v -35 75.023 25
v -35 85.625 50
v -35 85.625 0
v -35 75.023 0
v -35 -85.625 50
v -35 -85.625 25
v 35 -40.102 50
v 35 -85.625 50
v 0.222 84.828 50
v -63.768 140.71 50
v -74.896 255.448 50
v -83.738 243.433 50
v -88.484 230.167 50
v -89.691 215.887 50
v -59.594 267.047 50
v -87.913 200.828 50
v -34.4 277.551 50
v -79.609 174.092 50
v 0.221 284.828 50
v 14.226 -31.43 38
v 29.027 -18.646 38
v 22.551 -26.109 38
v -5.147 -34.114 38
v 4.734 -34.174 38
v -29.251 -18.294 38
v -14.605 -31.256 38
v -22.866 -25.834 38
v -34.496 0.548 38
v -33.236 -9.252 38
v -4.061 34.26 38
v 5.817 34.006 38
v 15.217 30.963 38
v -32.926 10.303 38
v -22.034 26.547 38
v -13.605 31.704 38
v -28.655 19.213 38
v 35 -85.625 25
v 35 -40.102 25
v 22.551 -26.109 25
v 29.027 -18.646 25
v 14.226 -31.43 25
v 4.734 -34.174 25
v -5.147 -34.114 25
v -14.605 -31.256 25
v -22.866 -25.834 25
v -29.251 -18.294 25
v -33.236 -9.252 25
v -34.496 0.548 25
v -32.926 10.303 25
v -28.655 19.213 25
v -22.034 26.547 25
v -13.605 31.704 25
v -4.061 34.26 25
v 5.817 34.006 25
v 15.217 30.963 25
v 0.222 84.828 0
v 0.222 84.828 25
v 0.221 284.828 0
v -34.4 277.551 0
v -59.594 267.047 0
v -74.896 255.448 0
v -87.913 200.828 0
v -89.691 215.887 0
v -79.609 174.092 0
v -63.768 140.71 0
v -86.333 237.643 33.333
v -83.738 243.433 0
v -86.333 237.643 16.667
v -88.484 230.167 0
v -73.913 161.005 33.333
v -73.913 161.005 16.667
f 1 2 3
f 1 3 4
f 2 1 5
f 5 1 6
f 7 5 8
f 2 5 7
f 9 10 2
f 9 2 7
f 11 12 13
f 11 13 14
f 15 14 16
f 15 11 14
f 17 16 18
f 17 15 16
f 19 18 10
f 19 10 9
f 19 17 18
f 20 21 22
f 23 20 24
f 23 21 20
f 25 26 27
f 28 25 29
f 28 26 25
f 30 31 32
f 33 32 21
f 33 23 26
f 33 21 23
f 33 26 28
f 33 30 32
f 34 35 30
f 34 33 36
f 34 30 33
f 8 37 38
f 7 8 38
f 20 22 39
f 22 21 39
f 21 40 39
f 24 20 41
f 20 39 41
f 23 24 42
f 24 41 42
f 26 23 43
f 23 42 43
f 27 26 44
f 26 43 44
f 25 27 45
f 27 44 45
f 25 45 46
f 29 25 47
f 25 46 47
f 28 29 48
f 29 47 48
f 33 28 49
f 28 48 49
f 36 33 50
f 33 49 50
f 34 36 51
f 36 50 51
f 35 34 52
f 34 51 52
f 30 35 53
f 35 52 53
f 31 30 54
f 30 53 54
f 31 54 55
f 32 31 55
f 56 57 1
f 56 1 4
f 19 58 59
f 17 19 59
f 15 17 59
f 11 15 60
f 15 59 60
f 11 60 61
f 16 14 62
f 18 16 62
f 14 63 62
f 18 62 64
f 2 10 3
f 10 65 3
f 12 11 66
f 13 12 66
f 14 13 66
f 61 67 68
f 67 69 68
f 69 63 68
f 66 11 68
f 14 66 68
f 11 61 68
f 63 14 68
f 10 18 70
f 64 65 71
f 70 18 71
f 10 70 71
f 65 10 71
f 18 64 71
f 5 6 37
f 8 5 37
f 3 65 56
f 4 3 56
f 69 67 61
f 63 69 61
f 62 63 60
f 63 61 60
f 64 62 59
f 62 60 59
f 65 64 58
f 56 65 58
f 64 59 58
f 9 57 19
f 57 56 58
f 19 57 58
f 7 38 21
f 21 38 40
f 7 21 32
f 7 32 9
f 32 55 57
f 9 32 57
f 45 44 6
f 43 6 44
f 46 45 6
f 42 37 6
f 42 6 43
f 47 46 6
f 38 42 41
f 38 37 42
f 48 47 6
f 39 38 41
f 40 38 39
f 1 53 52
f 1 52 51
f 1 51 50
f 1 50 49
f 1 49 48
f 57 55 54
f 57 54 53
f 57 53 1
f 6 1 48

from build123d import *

# Parameters (mm, degrees)
BOSS_EXTRUDE1_DEPTH = 50
SKETCH3_W           = 66.376369139
SKETCH3_H           = 188.96079622
CUT_EXTRUDE1_DEPTH  = 305.408240944
SKETCH4_R           = 34.5
CUT_EXTRUDE2_DEPTH  = 13


with BuildPart() as part:
    # Sketch1 → Boss-Extrude1 (new body)
    with BuildSketch(Plane.XY):
        with BuildLine():
            Line((0.221790001, 84.828286355), (0.2207262, 284.828286352))
            add(Edge.make_bspline(
                [(0.2207262, 284.828286352), (-159.978737061, 262.606607754), (-63.000724603, 150.139017081), (-35, 85.625)],
                knots=[0, 0, 0, 0, 1, 1, 1, 1], degree=3))
            Line((-35, 85.625), (-35, -85.625))
            Line((-35, -85.625), (35, -85.625))
            Line((35, -85.625), (35, -40.1019375))
            Line((35, -40.1019375), (0.221790001, 84.828286355))
        make_face()
    extrude(amount=BOSS_EXTRUDE1_DEPTH)

    # Sketch3 → Cut-Extrude1 (cut, through all)
    with BuildSketch(Plane(origin=(22.122011617, 6.158349372, 0), x_dir=(0, 0, -1), z_dir=(0.9633678796634119, 0.2681833858254875, 0))):
        with Locations((8.18818457, -12.819032142)):
            Rectangle(SKETCH3_W, SKETCH3_H)
    extrude(amount=-CUT_EXTRUDE1_DEPTH, mode=Mode.SUBTRACT)

    # Sketch4 → Cut-Extrude2 (cut)
    with BuildSketch(Plane(origin=(0, 0, 25), x_dir=(-1, 0, 0), z_dir=(0, 0, -1))):
        Circle(SKETCH4_R)
    extrude(amount=-CUT_EXTRUDE2_DEPTH, mode=Mode.SUBTRACT)


solid = part.part
